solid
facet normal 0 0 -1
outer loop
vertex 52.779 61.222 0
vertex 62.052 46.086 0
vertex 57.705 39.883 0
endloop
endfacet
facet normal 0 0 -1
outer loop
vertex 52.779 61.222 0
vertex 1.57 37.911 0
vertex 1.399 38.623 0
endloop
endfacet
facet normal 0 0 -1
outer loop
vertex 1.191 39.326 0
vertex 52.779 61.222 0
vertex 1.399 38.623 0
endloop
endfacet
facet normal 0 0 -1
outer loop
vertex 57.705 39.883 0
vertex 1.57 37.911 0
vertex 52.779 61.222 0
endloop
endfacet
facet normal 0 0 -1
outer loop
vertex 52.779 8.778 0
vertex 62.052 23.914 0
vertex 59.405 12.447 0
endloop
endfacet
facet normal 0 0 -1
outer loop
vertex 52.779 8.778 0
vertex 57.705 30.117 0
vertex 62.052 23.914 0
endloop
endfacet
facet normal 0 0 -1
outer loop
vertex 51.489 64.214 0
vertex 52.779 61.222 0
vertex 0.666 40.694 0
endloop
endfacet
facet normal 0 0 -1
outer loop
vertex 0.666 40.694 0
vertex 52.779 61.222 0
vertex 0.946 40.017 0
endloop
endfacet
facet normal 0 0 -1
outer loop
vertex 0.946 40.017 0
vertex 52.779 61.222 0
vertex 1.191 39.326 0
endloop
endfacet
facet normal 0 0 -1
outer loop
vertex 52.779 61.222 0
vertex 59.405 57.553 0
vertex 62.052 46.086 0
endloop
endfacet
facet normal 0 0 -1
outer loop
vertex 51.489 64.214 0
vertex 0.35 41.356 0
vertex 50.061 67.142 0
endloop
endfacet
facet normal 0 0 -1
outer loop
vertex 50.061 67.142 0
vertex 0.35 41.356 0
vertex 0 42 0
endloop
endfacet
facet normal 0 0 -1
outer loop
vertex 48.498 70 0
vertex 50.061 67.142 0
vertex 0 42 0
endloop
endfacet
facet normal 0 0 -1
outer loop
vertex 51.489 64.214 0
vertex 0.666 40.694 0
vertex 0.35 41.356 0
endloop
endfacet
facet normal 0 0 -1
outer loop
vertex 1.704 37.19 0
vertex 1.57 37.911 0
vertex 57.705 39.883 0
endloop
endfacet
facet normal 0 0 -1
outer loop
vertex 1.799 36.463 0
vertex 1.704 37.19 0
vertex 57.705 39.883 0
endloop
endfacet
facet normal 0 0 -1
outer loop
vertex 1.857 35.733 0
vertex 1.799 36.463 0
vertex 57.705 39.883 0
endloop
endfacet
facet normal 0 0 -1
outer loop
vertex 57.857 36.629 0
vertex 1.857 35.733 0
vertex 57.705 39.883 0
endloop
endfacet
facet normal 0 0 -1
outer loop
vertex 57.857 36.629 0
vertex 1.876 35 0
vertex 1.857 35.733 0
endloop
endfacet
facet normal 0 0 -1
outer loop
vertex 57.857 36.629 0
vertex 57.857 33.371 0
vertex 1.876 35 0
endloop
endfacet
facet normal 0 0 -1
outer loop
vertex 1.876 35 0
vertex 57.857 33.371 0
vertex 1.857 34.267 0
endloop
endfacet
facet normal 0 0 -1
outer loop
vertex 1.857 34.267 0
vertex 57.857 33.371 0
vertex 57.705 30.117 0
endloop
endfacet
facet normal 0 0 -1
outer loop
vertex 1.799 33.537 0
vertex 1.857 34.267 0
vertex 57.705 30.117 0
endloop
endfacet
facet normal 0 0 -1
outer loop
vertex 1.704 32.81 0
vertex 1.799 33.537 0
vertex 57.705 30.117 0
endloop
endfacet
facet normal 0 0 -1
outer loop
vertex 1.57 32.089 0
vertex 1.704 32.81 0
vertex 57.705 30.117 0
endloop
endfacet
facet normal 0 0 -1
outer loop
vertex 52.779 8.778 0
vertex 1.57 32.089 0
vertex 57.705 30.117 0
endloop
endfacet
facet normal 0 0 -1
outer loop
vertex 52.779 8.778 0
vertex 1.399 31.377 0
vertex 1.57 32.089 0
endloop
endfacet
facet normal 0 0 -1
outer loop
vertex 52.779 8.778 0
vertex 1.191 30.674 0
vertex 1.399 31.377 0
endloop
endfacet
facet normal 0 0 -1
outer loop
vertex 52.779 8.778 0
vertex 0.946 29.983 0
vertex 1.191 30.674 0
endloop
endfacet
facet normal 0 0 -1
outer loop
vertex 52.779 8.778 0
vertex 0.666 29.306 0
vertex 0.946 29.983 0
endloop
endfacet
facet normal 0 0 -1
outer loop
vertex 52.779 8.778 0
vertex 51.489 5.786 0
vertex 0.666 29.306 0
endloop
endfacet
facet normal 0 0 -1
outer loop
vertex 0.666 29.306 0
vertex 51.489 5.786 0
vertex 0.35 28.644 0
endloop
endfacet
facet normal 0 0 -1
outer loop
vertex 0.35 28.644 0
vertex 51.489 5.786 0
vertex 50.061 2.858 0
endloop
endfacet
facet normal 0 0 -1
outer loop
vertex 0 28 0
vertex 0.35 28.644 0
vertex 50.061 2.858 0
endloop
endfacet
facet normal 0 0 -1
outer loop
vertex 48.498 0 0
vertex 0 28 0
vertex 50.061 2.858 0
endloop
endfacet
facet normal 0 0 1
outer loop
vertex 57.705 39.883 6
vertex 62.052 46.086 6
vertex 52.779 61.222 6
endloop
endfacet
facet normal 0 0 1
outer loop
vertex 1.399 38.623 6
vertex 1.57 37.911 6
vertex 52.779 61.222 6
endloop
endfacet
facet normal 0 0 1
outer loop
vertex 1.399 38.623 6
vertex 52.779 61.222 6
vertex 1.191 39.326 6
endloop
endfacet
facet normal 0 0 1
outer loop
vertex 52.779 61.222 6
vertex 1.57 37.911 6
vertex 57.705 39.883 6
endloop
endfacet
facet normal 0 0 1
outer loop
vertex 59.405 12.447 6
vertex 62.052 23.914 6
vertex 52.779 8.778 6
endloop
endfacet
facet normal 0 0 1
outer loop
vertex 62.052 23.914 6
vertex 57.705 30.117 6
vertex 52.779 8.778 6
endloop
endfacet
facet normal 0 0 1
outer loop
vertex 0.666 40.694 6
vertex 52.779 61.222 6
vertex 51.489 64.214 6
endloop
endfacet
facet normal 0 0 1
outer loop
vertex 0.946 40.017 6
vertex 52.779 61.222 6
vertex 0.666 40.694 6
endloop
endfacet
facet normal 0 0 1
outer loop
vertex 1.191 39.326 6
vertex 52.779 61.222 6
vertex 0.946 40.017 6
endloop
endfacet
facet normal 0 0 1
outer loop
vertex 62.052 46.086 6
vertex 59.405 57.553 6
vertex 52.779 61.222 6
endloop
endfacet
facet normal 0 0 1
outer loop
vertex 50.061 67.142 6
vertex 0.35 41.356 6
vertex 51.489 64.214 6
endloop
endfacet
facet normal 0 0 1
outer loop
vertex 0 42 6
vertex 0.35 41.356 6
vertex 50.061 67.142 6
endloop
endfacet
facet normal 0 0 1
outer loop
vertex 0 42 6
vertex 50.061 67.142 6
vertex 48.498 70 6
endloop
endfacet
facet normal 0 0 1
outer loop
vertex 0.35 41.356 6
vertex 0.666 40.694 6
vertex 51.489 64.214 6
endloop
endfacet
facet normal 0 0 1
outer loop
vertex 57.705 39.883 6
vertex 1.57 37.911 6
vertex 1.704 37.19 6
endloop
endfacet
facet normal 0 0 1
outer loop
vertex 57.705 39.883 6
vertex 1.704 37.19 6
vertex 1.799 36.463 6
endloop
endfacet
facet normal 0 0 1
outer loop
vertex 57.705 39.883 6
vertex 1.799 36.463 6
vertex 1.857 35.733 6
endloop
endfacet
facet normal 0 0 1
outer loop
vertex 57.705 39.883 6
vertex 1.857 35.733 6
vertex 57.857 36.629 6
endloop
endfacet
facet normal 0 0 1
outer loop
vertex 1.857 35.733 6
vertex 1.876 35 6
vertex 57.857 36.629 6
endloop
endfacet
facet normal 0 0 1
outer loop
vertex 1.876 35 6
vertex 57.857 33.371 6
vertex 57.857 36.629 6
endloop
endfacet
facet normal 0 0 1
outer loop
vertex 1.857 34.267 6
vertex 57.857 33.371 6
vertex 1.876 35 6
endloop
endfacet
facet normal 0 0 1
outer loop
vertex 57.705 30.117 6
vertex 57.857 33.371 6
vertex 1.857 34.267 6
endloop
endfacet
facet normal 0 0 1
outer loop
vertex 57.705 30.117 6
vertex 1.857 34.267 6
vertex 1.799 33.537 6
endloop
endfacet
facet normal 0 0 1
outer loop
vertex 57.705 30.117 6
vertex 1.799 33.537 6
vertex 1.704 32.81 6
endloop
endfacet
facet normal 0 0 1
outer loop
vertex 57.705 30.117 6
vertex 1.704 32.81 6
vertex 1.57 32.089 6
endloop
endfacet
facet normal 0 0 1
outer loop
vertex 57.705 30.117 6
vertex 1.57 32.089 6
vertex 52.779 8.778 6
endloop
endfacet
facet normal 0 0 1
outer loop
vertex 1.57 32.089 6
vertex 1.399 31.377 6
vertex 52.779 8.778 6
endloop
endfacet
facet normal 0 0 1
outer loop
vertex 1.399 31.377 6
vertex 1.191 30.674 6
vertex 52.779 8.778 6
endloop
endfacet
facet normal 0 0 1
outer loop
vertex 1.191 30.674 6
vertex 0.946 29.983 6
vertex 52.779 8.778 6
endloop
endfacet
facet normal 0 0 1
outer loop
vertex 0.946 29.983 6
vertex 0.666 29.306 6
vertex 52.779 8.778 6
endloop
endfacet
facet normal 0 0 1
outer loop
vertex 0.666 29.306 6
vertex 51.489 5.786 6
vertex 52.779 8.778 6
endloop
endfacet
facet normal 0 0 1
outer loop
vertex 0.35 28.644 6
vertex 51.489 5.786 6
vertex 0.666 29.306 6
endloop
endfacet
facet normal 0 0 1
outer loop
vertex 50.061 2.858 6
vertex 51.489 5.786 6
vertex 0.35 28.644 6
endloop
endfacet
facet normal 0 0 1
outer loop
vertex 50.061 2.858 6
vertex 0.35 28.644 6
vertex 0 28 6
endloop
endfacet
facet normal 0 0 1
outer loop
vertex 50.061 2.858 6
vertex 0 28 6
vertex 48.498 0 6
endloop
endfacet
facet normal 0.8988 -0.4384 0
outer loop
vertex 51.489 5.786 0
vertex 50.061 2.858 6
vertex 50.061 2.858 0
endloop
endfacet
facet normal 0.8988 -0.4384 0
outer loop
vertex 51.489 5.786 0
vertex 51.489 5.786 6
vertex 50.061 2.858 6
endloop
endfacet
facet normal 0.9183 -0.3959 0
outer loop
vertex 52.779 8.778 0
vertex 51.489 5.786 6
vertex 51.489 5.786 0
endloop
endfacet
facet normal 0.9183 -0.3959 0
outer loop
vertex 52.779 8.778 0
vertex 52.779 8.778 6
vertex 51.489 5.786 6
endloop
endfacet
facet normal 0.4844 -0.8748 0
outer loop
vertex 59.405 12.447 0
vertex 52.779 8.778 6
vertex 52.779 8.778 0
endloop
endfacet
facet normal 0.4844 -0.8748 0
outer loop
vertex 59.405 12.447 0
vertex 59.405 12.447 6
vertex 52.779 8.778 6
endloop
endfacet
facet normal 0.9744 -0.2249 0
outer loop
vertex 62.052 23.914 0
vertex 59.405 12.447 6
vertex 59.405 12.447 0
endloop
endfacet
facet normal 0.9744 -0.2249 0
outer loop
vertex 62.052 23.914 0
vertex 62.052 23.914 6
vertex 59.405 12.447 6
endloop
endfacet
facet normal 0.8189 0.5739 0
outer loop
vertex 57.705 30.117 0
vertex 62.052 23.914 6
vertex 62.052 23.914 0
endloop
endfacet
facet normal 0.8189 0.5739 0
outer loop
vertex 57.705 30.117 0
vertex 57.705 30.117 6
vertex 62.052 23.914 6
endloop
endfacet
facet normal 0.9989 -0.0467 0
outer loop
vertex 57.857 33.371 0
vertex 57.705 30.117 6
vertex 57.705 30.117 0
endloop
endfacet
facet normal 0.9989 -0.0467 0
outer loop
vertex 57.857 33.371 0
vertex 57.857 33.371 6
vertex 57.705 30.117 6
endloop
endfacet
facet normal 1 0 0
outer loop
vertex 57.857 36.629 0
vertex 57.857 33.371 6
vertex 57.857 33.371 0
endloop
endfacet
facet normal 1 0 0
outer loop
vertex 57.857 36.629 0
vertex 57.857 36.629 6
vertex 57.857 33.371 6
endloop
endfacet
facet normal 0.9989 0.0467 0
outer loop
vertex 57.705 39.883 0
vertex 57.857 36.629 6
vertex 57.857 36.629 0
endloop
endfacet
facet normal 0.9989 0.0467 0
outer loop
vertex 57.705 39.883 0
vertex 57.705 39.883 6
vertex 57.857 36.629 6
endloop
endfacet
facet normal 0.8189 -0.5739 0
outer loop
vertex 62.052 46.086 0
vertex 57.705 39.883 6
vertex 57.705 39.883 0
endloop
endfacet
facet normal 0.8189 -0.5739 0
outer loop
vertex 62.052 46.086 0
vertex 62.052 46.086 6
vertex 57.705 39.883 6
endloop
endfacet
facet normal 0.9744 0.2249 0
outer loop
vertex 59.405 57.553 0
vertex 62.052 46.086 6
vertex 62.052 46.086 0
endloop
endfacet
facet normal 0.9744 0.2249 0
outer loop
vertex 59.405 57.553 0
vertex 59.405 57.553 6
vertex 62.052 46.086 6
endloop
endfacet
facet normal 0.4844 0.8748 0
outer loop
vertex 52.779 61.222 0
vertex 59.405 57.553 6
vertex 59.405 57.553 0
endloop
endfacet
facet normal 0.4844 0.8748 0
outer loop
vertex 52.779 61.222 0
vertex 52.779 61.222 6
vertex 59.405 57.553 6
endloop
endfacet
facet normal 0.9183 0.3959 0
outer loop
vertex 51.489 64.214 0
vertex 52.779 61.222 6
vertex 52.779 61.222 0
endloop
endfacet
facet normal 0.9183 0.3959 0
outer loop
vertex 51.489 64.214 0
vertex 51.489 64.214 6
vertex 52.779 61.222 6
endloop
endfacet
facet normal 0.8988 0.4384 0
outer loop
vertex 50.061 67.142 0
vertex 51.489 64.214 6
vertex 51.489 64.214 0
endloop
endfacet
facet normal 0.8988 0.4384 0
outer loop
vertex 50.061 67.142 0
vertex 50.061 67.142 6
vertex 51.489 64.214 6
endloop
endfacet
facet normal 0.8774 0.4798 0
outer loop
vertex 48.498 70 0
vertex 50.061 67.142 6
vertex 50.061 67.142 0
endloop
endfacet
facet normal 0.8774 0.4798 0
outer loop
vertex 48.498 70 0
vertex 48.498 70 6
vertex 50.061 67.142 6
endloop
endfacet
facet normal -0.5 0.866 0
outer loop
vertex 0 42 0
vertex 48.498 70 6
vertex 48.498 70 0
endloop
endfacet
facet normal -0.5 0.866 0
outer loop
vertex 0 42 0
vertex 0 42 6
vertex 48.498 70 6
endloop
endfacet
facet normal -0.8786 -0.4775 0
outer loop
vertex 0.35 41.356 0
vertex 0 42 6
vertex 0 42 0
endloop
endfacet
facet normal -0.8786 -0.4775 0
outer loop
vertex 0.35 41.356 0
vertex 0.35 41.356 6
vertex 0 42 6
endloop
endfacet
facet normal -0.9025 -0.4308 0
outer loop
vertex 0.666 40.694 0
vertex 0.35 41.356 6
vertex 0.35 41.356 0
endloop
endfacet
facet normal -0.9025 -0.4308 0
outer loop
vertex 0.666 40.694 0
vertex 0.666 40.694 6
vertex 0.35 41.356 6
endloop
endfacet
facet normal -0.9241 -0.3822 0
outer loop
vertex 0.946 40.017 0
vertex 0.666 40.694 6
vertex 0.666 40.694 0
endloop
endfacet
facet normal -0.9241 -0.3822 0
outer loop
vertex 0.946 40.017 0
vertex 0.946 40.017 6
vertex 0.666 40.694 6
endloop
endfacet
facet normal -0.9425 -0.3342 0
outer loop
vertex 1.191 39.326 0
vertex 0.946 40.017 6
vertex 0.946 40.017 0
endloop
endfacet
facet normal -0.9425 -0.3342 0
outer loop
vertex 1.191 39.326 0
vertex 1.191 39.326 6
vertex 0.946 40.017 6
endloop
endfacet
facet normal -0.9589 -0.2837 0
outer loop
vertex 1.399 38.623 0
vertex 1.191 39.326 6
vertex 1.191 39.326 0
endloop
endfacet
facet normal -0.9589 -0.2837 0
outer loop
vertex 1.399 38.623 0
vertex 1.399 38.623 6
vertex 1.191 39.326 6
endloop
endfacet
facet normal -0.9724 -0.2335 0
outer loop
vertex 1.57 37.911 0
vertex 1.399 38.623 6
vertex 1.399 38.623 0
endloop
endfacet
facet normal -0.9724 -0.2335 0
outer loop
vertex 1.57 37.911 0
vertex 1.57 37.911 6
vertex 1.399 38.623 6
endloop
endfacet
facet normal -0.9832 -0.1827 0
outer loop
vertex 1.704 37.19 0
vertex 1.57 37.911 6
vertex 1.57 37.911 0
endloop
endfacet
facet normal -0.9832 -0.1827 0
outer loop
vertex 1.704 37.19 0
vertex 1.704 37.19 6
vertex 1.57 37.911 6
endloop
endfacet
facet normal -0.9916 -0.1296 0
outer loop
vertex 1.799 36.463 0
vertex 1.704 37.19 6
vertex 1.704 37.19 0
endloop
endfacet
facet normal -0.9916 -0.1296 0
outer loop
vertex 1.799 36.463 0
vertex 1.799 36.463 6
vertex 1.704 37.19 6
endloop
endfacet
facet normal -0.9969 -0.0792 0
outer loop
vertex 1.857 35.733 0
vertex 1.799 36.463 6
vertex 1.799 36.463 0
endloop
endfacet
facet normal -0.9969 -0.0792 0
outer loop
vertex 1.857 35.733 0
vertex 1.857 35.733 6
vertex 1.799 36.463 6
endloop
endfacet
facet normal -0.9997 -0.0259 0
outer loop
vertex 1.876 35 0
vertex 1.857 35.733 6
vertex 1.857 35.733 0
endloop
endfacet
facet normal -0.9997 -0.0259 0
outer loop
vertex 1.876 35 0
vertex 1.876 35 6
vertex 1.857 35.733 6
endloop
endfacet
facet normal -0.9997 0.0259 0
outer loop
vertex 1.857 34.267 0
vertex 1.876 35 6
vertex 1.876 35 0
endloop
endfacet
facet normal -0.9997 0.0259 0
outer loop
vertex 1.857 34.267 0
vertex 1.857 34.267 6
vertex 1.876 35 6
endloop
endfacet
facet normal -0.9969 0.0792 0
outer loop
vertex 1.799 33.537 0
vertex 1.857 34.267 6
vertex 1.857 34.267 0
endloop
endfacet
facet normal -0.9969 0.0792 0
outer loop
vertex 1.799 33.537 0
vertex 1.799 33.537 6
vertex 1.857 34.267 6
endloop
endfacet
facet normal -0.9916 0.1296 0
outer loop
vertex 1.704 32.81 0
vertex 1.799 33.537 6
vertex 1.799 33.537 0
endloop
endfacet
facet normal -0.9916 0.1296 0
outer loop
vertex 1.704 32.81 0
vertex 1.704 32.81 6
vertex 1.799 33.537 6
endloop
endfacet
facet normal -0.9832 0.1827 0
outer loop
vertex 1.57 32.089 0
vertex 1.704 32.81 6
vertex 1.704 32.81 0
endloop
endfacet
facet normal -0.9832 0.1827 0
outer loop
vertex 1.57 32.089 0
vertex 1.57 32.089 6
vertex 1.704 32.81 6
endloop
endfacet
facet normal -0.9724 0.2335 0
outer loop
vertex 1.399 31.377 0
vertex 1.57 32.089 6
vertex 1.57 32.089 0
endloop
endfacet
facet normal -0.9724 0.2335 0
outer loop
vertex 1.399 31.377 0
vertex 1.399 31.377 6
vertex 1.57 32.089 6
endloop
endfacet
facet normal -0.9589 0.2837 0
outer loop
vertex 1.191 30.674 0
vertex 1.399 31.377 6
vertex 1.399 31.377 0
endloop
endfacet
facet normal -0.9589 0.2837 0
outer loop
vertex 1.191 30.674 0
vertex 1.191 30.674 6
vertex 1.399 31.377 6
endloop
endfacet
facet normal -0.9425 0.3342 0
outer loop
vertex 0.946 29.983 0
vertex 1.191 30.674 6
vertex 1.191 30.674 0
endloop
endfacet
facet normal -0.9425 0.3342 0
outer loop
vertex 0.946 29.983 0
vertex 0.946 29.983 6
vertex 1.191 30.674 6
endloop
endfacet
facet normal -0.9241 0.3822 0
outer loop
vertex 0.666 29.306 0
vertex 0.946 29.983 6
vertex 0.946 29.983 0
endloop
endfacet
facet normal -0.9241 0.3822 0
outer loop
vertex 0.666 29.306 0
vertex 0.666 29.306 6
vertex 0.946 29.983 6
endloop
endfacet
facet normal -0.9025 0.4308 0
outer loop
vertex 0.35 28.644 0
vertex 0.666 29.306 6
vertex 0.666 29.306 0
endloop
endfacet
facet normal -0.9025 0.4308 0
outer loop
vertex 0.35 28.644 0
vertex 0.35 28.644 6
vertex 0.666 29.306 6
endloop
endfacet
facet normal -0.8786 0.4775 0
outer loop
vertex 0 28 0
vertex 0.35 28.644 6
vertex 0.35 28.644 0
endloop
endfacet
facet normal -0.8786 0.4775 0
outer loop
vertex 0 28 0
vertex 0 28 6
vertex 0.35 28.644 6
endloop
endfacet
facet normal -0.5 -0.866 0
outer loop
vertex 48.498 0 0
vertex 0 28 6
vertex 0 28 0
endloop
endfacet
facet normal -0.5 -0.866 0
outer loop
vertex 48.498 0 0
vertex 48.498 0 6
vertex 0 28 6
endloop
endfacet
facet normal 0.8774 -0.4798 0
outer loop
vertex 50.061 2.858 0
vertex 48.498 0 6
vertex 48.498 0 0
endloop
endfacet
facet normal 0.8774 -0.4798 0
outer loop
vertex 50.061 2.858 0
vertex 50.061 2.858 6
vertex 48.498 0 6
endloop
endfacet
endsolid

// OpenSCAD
$fn = 32;

// ----------------------------------------------------------------------
// Gear sector: 2 teeth on 60 degrees
// ----------------------------------------------------------------------

// --- parameters (mm) ---
sector_angle = 60;        // sector angle, degrees
root_r = 70;              // root circle radius
tooth_h = 5;              // tooth height over the root circle
teeth = 2;                // number of teeth on the sector
hub_r = 14;               // hub bore radius
plate_t = 6;              // sector thickness, Z
arc_step = 3;             // sampling step of the root/hub arcs, degrees
fit_tol = 0.05;           // declared fit tolerance (prompt contract)
free_tol = 0.2;           // declared free tolerance (prompt contract)

tip_r = root_r + tooth_h;  // tip circle radius

profile = [[48.498, 0], [50.061, 2.858], [51.489, 5.786], [52.779, 8.778], [59.405, 12.447], [62.052, 23.914], [57.705, 30.117], [57.857, 33.371], [57.857, 36.629], [57.705, 39.883], [62.052, 46.086], [59.405, 57.553], [52.779, 61.222], [51.489, 64.214], [50.061, 67.142], [48.498, 70], [0, 42], [0.35, 41.356], [0.666, 40.694], [0.946, 40.017], [1.191, 39.326], [1.399, 38.623], [1.57, 37.911], [1.704, 37.19], [1.799, 36.463], [1.857, 35.733], [1.876, 35], [1.857, 34.267], [1.799, 33.537], [1.704, 32.81], [1.57, 32.089], [1.399, 31.377], [1.191, 30.674], [0.946, 29.983], [0.666, 29.306], [0.35, 28.644], [0, 28]];  // primary outline, 37 points, counter clockwise

// --- the one profile operation ---
linear_extrude(height = plate_t) polygon(points = profile);
